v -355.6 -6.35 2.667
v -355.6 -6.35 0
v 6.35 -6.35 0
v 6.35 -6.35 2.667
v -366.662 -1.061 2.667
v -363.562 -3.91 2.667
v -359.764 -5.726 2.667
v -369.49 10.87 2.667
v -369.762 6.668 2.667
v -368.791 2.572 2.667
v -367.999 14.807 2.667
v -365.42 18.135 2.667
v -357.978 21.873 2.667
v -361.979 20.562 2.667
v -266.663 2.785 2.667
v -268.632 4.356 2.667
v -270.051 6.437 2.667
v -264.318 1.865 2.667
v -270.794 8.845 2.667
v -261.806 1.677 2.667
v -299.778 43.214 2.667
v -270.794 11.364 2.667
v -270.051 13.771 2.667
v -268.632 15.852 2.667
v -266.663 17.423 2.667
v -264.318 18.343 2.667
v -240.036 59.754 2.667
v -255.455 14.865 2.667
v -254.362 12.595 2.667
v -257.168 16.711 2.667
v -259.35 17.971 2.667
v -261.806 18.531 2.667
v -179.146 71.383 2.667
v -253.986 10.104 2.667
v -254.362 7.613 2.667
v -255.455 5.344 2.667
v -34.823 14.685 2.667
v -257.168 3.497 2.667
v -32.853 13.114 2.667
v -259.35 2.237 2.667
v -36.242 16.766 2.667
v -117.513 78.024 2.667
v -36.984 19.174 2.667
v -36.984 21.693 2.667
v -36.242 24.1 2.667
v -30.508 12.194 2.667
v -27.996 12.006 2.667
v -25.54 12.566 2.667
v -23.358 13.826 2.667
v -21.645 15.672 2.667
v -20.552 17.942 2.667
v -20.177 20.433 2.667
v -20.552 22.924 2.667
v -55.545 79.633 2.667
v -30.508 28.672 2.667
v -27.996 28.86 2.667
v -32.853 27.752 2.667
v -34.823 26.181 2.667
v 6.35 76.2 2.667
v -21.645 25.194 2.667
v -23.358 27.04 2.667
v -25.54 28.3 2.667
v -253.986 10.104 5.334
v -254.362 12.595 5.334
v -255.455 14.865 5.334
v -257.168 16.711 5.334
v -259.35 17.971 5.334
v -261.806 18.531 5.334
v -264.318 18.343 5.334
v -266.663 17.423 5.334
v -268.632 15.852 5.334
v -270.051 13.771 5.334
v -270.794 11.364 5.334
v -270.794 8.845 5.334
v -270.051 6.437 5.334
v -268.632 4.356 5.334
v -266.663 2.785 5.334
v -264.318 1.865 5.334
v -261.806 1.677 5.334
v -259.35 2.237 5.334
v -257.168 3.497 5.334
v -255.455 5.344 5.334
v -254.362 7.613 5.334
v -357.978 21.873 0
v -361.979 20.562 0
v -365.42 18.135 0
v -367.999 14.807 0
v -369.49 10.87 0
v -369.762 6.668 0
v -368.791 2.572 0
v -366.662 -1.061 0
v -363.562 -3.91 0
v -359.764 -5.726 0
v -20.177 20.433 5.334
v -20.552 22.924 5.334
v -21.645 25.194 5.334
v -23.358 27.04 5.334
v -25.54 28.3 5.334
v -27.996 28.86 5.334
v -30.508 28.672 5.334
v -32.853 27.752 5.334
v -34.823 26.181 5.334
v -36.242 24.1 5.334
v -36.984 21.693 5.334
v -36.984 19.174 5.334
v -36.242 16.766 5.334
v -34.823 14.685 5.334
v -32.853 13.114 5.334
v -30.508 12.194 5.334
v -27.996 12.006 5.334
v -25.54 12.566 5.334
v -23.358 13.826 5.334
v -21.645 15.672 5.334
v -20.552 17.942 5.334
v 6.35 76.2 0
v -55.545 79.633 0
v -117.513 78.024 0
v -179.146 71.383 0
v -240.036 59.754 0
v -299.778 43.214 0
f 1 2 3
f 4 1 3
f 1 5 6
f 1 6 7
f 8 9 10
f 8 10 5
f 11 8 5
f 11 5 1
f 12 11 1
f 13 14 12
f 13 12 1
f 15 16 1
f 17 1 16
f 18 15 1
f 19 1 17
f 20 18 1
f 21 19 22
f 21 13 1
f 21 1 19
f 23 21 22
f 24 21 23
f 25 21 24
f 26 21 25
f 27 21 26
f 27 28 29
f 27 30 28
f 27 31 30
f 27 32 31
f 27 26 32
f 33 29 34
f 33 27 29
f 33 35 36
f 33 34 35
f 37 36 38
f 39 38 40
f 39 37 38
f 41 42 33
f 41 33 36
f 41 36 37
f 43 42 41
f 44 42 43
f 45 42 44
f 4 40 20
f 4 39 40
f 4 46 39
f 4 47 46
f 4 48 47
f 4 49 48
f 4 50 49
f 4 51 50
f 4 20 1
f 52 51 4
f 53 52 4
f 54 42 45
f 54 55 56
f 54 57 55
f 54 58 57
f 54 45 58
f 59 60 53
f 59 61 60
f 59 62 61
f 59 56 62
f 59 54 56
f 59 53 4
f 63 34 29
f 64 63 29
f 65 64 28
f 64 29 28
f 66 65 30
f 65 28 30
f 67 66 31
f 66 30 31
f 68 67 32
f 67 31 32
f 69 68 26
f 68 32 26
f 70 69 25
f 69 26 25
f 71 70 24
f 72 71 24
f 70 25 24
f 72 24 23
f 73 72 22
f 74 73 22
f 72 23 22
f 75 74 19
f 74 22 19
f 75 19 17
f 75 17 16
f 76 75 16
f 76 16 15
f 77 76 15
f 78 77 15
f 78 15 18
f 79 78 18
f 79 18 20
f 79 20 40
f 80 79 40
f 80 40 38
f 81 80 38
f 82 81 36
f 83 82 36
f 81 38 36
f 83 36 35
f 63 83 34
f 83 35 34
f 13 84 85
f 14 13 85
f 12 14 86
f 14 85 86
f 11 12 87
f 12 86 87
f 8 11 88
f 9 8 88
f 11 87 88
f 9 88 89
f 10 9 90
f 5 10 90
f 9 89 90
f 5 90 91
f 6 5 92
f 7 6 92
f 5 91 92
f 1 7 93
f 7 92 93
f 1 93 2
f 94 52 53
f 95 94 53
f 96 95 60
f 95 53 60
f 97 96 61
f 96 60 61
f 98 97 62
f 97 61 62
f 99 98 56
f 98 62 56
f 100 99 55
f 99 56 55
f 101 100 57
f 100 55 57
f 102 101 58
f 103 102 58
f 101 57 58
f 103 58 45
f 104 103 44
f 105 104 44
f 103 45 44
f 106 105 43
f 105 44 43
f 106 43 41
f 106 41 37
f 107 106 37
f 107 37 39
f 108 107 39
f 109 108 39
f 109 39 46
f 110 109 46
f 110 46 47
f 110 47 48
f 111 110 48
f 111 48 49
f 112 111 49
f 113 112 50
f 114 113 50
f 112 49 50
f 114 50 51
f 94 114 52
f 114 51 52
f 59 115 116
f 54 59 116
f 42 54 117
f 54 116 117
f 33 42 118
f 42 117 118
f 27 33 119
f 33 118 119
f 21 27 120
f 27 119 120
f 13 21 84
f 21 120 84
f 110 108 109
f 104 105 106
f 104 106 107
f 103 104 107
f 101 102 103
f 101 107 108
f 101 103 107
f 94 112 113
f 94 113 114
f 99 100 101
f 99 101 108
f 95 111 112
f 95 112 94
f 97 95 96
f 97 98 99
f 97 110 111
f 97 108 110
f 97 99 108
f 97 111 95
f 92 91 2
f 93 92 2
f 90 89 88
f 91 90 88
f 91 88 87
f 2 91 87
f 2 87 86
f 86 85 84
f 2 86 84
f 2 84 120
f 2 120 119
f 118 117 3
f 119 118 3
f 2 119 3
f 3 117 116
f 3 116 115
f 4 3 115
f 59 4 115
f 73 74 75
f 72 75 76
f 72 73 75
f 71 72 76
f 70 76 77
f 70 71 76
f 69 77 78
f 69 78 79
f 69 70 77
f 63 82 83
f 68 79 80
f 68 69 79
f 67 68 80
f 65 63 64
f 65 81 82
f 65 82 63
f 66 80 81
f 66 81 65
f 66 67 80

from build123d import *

# Parameters (mm, degrees)
BASE_EXTRUDE_DEPTH  = 2.667
SKETCH2_R           = 8.450958565
BOSS_EXTRUDE1_DEPTH = 2.667


with BuildPart() as part:
    # Sketch1 → Base-Extrude (new body)
    with BuildSketch(Plane.XY):
        with BuildLine():
            Line((6.35, -6.35), (6.35, 76.2))
            ThreePointArc((6.35, 76.2), (-179.146372853, 71.382862664), (-357.978470471, 21.873368468))
            ThreePointArc((-357.978470471, 21.873368468), (-369.761705842, 6.668454051), (-355.6, -6.35))
            Line((-355.6, -6.35), (6.35, -6.35))
        make_face()
    extrude(amount=BASE_EXTRUDE_DEPTH)

    # Sketch2 → Boss-Extrude1 (add)
    with BuildSketch(Plane.XY.offset(2.667)):
        with Locations((-262.437432145, 10.104106788)):
            Circle(SKETCH2_R)
        with Locations((-28.627578506, 20.433056145)):
            Circle(SKETCH2_R)
    extrude(amount=BOSS_EXTRUDE1_DEPTH)


solid = part.part
